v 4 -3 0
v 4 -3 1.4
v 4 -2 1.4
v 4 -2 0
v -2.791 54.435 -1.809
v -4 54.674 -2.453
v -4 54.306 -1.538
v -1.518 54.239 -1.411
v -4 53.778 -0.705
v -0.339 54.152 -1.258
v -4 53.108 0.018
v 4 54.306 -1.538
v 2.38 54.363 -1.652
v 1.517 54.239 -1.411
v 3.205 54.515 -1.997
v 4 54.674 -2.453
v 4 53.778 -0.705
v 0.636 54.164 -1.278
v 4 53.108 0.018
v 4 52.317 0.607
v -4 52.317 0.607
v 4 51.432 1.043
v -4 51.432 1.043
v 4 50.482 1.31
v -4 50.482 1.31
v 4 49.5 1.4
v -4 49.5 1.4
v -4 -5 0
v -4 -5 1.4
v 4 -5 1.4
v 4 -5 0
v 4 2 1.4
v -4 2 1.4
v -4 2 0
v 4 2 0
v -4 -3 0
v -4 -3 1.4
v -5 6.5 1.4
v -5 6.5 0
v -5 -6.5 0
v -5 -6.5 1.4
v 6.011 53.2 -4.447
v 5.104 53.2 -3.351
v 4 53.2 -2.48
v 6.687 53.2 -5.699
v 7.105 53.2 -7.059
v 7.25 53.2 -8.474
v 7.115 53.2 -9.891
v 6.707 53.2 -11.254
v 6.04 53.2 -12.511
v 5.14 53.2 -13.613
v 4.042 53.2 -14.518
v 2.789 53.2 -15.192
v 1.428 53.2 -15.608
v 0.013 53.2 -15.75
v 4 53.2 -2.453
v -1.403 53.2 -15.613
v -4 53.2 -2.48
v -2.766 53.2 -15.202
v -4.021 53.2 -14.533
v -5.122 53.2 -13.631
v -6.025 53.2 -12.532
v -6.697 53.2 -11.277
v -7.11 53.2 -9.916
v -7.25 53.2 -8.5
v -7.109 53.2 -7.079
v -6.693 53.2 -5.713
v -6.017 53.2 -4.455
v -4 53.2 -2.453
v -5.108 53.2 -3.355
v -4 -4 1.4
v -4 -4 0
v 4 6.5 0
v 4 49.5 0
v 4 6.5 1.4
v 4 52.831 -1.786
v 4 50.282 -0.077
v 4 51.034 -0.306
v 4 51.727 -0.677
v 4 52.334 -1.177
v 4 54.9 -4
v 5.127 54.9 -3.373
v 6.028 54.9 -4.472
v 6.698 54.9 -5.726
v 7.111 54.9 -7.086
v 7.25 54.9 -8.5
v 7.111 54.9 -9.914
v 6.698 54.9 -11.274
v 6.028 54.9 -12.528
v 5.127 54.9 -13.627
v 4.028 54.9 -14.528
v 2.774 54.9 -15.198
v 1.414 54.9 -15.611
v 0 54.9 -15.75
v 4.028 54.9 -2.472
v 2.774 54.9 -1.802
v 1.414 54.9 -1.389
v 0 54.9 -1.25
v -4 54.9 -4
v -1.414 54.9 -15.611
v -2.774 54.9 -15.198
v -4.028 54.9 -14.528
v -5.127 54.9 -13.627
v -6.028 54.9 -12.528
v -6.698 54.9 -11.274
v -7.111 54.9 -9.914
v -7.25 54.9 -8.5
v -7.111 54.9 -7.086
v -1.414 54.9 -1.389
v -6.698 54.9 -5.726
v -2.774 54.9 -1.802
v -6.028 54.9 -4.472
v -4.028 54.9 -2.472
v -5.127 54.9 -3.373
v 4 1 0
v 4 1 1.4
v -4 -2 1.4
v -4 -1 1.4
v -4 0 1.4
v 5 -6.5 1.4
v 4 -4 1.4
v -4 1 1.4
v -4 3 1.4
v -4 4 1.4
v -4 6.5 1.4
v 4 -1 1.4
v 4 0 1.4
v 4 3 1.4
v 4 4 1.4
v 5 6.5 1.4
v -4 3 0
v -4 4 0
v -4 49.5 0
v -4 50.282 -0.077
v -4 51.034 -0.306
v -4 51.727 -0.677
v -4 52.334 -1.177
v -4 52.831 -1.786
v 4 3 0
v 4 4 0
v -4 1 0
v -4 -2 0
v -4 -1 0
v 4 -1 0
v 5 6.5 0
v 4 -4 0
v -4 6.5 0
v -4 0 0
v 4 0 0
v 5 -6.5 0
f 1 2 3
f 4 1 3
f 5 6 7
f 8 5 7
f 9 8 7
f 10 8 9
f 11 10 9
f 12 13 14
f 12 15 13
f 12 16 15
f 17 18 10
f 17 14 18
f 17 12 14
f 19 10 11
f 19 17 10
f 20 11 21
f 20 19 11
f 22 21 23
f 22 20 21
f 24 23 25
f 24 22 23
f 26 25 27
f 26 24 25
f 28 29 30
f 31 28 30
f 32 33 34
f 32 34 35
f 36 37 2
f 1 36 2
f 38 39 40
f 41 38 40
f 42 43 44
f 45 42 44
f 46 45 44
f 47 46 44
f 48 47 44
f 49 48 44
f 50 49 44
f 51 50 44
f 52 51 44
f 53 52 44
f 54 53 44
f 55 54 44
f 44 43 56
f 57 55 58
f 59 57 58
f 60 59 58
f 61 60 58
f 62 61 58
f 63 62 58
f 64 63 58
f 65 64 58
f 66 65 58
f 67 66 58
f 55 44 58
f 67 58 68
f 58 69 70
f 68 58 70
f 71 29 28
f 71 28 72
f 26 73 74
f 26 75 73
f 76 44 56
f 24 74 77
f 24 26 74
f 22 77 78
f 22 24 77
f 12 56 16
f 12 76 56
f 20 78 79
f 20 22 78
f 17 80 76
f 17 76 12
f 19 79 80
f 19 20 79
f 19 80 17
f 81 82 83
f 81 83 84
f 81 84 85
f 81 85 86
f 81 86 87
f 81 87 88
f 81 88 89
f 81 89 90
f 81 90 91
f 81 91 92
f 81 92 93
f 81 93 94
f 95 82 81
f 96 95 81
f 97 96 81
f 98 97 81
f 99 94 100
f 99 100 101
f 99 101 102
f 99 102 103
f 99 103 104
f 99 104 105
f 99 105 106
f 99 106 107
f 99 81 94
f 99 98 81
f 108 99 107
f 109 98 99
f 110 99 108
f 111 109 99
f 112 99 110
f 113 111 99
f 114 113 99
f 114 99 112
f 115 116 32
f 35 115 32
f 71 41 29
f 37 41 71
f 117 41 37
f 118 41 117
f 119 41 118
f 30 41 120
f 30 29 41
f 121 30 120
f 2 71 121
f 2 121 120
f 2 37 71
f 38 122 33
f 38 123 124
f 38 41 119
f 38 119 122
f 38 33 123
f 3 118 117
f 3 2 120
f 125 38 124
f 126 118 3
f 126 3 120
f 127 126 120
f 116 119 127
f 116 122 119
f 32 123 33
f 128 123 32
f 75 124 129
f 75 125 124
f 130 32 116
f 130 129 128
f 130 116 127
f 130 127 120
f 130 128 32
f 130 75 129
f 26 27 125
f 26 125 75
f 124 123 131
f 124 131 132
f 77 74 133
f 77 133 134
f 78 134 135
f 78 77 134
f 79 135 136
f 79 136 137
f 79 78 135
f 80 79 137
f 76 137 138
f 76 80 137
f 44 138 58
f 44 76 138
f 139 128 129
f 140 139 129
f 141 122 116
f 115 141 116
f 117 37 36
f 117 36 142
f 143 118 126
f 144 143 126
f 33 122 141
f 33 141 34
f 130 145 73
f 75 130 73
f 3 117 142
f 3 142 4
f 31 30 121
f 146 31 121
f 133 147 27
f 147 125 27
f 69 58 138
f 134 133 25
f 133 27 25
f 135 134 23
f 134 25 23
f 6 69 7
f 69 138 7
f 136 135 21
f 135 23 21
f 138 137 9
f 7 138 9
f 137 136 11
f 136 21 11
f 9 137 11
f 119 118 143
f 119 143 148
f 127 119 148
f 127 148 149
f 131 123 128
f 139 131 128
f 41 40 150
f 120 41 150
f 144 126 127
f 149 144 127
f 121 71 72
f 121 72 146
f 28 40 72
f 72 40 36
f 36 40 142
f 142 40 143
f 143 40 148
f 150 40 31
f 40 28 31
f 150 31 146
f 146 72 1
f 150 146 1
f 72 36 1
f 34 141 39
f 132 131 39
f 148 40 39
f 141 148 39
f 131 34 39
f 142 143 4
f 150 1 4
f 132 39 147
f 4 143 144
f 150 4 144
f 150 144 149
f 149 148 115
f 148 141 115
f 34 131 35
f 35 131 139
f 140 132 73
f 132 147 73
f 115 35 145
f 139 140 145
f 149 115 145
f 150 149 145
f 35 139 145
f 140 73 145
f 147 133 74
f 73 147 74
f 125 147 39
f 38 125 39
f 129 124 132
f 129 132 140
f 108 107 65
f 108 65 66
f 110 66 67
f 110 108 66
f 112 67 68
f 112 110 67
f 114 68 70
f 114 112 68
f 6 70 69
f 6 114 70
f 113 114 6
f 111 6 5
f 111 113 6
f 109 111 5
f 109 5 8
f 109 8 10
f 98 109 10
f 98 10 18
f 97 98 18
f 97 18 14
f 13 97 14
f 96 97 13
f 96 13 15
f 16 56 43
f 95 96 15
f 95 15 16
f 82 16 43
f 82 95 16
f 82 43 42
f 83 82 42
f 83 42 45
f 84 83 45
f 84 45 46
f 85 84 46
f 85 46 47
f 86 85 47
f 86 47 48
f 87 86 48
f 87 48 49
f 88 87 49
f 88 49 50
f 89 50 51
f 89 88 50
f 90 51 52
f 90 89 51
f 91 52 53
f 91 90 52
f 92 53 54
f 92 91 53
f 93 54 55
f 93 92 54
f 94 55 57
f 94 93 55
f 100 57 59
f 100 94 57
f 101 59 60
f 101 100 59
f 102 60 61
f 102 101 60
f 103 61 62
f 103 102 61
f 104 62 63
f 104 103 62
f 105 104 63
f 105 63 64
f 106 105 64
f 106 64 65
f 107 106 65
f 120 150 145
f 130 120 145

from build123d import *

# Parameters (mm, degrees)
F0_W     = 8
F0_H     = 43
F1_DEPTH = 1.4
F3_DEPTH = 8
F5_R     = 7.25
F6_DEPTH = 1.7
F7_W     = 8
F7_H     = 1
F8_DEPTH = 1.4


with BuildPart() as f1:
    # F0 (on Top) → F1 (new body)
    with BuildSketch(Plane.XY):
        with Locations((0, 28)):
            Rectangle(F0_W, F0_H)
        Polygon((5, -6.5), (5, 6.5), (4, 6.5), (-4, 6.5), (-5, 6.5), (-5, -6.5), align=None)
    extrude(amount=F1_DEPTH)

    # F2 (on face) → F3 (join, through all)
    with BuildSketch(Plane.YZ.offset(4)):
        with BuildLine():
            ThreePointArc((49.5, 0), (52.72945, -1.639777), (53.311111, -5.214674))
            Line((53.311111, -5.214674), (54.9, -4))
            ThreePointArc((54.9, -4), (53.318377, -0.181623), (49.5, 1.4))
            Line((49.5, 1.4), (49.5, 0))
        make_face()
    extrude(amount=-F3_DEPTH)

    # F5 (on face) → F6 (join)
    with BuildSketch(Plane(origin=(0, 54.9, 0), x_dir=(-1, 0, 0), z_dir=(0, 1, 0))):
        with Locations((0, -8.5)):
            Circle(F5_R)
    extrude(amount=-F6_DEPTH)

    # F7 (on face) → F8 (cut, through all)
    with BuildSketch(Plane.XY.offset(1.4)):
        with Locations((0, -4.5)):
            Rectangle(F7_W, F7_H)
        with Locations((0, -2.5)):
            Rectangle(F7_W, F7_H)
        with Locations((0, -0.5)):
            Rectangle(F7_W, F7_H)
        with Locations((0, 1.5)):
            Rectangle(F7_W, F7_H)
        with Locations((0, 3.5)):
            Rectangle(F7_W, F7_H)
    extrude(amount=-F8_DEPTH, mode=Mode.SUBTRACT)


solid = f1.part
